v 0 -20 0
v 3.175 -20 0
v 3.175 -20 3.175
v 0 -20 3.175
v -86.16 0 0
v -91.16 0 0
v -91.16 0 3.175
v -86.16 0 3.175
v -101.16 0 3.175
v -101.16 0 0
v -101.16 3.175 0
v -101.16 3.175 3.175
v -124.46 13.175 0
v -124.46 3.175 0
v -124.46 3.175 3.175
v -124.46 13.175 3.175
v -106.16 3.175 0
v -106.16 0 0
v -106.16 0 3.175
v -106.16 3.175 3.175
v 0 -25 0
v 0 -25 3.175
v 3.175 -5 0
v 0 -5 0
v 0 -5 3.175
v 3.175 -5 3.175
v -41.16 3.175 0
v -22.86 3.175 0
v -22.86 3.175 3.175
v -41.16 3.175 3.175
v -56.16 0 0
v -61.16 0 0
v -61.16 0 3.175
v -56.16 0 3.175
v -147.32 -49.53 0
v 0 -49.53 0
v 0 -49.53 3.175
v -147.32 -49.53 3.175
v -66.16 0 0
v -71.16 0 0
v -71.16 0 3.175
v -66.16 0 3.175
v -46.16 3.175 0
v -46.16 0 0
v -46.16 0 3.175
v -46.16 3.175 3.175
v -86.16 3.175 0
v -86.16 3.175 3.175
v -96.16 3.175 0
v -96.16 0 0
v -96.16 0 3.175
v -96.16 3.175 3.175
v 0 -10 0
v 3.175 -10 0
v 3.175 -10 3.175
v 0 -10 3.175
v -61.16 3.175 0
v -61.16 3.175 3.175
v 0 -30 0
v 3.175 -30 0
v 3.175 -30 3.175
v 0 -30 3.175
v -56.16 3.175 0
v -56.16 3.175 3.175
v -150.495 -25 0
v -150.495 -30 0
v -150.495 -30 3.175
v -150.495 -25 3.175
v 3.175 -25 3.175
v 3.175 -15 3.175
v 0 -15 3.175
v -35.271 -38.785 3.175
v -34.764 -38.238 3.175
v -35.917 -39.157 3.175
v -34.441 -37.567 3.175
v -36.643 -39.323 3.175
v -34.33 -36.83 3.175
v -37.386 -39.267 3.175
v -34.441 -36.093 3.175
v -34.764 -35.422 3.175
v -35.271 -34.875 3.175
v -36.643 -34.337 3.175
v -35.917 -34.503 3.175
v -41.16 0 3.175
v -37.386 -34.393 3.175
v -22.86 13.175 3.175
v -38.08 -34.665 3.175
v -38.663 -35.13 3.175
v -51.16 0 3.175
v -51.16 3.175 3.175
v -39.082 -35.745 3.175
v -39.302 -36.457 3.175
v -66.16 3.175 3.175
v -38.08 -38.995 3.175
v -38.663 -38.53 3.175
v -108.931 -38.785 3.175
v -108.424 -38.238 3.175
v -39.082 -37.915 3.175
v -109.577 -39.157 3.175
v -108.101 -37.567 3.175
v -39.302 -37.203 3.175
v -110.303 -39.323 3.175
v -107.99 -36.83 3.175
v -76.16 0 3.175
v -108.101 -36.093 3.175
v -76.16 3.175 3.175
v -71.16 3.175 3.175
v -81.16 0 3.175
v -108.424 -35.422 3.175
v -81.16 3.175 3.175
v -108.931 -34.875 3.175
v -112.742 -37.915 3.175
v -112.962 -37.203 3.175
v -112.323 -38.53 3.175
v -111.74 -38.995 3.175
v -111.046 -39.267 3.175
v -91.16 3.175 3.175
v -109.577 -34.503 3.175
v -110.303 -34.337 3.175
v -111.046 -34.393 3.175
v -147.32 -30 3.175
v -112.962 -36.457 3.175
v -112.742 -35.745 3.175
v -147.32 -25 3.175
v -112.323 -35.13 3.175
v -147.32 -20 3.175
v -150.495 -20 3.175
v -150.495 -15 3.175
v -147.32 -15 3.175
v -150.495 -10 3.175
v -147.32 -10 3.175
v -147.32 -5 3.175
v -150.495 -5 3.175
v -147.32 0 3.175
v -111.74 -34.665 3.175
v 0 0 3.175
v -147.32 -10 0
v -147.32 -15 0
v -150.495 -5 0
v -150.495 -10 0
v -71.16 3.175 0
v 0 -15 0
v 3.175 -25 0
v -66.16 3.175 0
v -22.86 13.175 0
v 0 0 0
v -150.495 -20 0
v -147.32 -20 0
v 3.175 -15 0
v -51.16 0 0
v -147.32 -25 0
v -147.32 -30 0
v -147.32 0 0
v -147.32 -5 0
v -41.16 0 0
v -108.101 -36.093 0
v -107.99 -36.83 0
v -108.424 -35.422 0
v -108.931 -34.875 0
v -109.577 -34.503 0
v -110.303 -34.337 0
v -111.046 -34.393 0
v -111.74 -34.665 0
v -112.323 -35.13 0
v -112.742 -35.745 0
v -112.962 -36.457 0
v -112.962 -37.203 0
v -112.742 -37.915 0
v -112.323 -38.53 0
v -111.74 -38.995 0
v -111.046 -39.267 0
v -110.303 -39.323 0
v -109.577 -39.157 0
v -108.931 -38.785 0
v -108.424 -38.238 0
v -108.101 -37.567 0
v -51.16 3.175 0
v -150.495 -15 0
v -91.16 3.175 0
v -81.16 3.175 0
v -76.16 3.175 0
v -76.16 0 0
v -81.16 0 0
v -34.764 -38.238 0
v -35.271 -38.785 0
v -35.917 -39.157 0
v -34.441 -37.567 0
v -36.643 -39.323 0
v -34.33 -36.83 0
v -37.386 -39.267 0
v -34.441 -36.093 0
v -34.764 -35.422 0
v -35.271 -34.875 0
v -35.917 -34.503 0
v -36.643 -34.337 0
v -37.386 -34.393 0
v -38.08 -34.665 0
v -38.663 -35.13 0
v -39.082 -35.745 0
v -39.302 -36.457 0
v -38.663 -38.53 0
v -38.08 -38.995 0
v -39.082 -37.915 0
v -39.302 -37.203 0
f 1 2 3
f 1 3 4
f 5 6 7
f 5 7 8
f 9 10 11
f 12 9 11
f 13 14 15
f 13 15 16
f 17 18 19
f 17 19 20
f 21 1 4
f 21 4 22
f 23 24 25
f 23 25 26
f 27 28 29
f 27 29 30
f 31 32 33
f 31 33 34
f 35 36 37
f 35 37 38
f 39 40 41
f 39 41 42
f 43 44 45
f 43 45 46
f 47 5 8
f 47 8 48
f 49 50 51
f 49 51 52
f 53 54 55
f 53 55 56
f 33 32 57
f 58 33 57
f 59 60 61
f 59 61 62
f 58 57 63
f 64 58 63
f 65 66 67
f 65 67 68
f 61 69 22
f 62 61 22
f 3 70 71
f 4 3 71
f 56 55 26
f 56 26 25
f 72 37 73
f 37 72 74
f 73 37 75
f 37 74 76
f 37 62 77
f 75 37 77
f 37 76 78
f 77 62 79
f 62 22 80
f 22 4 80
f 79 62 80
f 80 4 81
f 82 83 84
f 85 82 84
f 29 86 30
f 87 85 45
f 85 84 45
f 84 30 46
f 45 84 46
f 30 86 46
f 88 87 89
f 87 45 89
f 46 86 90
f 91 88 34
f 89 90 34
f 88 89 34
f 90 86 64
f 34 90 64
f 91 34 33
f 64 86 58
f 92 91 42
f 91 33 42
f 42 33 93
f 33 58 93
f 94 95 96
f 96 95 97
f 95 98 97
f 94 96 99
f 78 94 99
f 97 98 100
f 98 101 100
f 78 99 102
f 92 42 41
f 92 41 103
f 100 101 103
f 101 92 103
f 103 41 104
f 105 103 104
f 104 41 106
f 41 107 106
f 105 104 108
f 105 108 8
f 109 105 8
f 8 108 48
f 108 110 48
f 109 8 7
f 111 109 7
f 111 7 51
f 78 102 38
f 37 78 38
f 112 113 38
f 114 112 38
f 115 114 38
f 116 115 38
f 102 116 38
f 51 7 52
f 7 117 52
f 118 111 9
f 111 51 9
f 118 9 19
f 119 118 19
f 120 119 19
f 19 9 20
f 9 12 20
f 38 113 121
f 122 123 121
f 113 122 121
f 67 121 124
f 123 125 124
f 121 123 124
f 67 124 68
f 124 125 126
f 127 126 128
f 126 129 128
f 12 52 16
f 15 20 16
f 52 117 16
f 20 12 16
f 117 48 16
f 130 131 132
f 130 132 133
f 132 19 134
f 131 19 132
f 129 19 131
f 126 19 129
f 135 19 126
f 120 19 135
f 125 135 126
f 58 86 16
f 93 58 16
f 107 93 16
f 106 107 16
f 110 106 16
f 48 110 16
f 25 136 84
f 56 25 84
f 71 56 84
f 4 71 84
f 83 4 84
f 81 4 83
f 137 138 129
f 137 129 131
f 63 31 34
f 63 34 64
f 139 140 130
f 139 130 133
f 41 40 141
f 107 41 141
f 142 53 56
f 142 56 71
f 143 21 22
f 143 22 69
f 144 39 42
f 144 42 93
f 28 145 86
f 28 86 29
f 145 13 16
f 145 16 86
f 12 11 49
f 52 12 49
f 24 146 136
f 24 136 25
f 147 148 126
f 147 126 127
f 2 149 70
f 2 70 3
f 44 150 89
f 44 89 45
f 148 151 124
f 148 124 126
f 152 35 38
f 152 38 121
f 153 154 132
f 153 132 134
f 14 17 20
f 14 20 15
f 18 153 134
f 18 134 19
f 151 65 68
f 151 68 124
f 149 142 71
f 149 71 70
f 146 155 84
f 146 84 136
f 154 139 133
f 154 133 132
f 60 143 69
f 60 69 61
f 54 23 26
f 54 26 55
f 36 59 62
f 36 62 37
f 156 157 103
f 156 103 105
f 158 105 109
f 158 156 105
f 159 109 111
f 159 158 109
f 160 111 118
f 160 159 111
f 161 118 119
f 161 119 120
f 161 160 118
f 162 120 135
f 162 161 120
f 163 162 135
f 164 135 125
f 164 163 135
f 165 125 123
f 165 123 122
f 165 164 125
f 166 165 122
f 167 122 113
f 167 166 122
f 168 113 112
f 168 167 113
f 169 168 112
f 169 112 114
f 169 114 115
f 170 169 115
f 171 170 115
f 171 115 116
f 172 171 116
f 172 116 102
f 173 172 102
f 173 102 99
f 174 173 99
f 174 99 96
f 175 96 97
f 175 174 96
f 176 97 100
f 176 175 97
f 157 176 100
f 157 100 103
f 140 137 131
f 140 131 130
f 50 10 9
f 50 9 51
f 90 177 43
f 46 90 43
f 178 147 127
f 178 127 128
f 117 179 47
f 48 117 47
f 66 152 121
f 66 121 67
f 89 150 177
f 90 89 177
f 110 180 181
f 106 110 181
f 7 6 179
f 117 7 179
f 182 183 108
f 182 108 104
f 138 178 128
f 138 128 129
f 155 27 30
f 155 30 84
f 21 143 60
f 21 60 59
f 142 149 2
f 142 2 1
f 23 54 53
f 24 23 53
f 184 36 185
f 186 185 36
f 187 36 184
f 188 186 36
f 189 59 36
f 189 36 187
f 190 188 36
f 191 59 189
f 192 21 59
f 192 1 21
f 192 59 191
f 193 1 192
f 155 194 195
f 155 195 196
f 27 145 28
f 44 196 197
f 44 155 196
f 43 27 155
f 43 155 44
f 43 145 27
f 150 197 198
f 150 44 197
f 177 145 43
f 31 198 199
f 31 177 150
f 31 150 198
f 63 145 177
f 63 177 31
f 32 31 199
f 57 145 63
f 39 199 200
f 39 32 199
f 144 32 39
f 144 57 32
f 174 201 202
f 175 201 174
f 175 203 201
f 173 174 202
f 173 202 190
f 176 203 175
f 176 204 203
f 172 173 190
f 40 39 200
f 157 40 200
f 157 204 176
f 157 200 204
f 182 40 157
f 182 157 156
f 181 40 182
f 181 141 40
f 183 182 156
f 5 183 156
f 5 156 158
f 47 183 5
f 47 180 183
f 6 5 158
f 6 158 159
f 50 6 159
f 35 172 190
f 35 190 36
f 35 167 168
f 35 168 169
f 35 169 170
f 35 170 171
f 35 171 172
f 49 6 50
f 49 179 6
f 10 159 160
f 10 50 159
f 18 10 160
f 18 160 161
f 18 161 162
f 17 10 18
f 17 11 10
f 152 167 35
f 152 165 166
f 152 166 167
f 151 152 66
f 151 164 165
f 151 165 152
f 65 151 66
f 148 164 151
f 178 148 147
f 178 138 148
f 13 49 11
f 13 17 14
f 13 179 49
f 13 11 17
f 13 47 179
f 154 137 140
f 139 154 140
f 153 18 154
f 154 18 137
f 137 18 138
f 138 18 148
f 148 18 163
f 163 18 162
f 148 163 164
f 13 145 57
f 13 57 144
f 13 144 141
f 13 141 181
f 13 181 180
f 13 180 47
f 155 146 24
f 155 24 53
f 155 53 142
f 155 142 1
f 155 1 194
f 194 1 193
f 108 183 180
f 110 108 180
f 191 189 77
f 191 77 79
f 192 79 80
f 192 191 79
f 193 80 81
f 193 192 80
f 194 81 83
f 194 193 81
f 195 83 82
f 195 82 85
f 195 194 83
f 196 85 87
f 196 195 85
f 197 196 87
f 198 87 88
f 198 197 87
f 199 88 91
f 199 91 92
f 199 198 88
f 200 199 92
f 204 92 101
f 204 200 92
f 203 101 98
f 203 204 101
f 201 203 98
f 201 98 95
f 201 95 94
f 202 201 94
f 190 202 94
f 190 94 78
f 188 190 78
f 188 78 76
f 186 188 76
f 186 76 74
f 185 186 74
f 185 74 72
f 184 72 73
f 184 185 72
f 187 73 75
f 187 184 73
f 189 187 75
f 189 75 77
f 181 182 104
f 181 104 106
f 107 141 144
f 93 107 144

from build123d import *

# Parameters (mm, degrees)
SKETCH1_R           = 2.5
SKETCH1_W           = 5
SKETCH1_H           = 3.175
BOSS_EXTRUDE1_DEPTH = 3.175


with BuildPart() as part:
    # Sketch1 → Boss-Extrude1 (new body)
    with BuildSketch(Plane.XY):
        Polygon((-147.32, 0), (-106.16, 0), (-106.16, 3.175), (-124.46, 3.175), (-124.46, 13.175), (-22.86, 13.175), (-22.86, 3.175), (-41.16, 3.175), (-41.16, 0), (0, 0), (0, -5), (3.175, -5), (3.175, -10), (0, -10), (0, -15), (3.175, -15), (3.175, -20), (0, -20), (0, -25), (3.175, -25), (3.175, -30), (0, -30), (0, -49.53), (-147.32, -49.53), (-147.32, -30), (-150.495, -30), (-150.495, -25), (-147.32, -25), (-147.32, -20), (-150.495, -20), (-150.495, -15), (-147.32, -15), (-147.32, -10), (-150.495, -10), (-150.495, -5), (-147.32, -5), align=None)
        with Locations((-110.49, -36.83)):
            Circle(SKETCH1_R, mode=Mode.SUBTRACT)
        with Locations((-36.83, -36.83)):
            Circle(SKETCH1_R, mode=Mode.SUBTRACT)
        with Locations((-98.66, 1.5875)):
            Rectangle(SKETCH1_W, SKETCH1_H, mode=Mode.SUBTRACT)
        with Locations((-48.66, 1.5875)):
            Rectangle(SKETCH1_W, SKETCH1_H, mode=Mode.SUBTRACT)
        with Locations((-88.66, 1.5875)):
            Rectangle(SKETCH1_W, SKETCH1_H, mode=Mode.SUBTRACT)
        with Locations((-78.66, 1.5875)):
            Rectangle(SKETCH1_W, SKETCH1_H, mode=Mode.SUBTRACT)
        with Locations((-68.66, 1.5875)):
            Rectangle(SKETCH1_W, SKETCH1_H, mode=Mode.SUBTRACT)
        with Locations((-58.66, 1.5875)):
            Rectangle(SKETCH1_W, SKETCH1_H, mode=Mode.SUBTRACT)
    extrude(amount=BOSS_EXTRUDE1_DEPTH)


solid = part.part
